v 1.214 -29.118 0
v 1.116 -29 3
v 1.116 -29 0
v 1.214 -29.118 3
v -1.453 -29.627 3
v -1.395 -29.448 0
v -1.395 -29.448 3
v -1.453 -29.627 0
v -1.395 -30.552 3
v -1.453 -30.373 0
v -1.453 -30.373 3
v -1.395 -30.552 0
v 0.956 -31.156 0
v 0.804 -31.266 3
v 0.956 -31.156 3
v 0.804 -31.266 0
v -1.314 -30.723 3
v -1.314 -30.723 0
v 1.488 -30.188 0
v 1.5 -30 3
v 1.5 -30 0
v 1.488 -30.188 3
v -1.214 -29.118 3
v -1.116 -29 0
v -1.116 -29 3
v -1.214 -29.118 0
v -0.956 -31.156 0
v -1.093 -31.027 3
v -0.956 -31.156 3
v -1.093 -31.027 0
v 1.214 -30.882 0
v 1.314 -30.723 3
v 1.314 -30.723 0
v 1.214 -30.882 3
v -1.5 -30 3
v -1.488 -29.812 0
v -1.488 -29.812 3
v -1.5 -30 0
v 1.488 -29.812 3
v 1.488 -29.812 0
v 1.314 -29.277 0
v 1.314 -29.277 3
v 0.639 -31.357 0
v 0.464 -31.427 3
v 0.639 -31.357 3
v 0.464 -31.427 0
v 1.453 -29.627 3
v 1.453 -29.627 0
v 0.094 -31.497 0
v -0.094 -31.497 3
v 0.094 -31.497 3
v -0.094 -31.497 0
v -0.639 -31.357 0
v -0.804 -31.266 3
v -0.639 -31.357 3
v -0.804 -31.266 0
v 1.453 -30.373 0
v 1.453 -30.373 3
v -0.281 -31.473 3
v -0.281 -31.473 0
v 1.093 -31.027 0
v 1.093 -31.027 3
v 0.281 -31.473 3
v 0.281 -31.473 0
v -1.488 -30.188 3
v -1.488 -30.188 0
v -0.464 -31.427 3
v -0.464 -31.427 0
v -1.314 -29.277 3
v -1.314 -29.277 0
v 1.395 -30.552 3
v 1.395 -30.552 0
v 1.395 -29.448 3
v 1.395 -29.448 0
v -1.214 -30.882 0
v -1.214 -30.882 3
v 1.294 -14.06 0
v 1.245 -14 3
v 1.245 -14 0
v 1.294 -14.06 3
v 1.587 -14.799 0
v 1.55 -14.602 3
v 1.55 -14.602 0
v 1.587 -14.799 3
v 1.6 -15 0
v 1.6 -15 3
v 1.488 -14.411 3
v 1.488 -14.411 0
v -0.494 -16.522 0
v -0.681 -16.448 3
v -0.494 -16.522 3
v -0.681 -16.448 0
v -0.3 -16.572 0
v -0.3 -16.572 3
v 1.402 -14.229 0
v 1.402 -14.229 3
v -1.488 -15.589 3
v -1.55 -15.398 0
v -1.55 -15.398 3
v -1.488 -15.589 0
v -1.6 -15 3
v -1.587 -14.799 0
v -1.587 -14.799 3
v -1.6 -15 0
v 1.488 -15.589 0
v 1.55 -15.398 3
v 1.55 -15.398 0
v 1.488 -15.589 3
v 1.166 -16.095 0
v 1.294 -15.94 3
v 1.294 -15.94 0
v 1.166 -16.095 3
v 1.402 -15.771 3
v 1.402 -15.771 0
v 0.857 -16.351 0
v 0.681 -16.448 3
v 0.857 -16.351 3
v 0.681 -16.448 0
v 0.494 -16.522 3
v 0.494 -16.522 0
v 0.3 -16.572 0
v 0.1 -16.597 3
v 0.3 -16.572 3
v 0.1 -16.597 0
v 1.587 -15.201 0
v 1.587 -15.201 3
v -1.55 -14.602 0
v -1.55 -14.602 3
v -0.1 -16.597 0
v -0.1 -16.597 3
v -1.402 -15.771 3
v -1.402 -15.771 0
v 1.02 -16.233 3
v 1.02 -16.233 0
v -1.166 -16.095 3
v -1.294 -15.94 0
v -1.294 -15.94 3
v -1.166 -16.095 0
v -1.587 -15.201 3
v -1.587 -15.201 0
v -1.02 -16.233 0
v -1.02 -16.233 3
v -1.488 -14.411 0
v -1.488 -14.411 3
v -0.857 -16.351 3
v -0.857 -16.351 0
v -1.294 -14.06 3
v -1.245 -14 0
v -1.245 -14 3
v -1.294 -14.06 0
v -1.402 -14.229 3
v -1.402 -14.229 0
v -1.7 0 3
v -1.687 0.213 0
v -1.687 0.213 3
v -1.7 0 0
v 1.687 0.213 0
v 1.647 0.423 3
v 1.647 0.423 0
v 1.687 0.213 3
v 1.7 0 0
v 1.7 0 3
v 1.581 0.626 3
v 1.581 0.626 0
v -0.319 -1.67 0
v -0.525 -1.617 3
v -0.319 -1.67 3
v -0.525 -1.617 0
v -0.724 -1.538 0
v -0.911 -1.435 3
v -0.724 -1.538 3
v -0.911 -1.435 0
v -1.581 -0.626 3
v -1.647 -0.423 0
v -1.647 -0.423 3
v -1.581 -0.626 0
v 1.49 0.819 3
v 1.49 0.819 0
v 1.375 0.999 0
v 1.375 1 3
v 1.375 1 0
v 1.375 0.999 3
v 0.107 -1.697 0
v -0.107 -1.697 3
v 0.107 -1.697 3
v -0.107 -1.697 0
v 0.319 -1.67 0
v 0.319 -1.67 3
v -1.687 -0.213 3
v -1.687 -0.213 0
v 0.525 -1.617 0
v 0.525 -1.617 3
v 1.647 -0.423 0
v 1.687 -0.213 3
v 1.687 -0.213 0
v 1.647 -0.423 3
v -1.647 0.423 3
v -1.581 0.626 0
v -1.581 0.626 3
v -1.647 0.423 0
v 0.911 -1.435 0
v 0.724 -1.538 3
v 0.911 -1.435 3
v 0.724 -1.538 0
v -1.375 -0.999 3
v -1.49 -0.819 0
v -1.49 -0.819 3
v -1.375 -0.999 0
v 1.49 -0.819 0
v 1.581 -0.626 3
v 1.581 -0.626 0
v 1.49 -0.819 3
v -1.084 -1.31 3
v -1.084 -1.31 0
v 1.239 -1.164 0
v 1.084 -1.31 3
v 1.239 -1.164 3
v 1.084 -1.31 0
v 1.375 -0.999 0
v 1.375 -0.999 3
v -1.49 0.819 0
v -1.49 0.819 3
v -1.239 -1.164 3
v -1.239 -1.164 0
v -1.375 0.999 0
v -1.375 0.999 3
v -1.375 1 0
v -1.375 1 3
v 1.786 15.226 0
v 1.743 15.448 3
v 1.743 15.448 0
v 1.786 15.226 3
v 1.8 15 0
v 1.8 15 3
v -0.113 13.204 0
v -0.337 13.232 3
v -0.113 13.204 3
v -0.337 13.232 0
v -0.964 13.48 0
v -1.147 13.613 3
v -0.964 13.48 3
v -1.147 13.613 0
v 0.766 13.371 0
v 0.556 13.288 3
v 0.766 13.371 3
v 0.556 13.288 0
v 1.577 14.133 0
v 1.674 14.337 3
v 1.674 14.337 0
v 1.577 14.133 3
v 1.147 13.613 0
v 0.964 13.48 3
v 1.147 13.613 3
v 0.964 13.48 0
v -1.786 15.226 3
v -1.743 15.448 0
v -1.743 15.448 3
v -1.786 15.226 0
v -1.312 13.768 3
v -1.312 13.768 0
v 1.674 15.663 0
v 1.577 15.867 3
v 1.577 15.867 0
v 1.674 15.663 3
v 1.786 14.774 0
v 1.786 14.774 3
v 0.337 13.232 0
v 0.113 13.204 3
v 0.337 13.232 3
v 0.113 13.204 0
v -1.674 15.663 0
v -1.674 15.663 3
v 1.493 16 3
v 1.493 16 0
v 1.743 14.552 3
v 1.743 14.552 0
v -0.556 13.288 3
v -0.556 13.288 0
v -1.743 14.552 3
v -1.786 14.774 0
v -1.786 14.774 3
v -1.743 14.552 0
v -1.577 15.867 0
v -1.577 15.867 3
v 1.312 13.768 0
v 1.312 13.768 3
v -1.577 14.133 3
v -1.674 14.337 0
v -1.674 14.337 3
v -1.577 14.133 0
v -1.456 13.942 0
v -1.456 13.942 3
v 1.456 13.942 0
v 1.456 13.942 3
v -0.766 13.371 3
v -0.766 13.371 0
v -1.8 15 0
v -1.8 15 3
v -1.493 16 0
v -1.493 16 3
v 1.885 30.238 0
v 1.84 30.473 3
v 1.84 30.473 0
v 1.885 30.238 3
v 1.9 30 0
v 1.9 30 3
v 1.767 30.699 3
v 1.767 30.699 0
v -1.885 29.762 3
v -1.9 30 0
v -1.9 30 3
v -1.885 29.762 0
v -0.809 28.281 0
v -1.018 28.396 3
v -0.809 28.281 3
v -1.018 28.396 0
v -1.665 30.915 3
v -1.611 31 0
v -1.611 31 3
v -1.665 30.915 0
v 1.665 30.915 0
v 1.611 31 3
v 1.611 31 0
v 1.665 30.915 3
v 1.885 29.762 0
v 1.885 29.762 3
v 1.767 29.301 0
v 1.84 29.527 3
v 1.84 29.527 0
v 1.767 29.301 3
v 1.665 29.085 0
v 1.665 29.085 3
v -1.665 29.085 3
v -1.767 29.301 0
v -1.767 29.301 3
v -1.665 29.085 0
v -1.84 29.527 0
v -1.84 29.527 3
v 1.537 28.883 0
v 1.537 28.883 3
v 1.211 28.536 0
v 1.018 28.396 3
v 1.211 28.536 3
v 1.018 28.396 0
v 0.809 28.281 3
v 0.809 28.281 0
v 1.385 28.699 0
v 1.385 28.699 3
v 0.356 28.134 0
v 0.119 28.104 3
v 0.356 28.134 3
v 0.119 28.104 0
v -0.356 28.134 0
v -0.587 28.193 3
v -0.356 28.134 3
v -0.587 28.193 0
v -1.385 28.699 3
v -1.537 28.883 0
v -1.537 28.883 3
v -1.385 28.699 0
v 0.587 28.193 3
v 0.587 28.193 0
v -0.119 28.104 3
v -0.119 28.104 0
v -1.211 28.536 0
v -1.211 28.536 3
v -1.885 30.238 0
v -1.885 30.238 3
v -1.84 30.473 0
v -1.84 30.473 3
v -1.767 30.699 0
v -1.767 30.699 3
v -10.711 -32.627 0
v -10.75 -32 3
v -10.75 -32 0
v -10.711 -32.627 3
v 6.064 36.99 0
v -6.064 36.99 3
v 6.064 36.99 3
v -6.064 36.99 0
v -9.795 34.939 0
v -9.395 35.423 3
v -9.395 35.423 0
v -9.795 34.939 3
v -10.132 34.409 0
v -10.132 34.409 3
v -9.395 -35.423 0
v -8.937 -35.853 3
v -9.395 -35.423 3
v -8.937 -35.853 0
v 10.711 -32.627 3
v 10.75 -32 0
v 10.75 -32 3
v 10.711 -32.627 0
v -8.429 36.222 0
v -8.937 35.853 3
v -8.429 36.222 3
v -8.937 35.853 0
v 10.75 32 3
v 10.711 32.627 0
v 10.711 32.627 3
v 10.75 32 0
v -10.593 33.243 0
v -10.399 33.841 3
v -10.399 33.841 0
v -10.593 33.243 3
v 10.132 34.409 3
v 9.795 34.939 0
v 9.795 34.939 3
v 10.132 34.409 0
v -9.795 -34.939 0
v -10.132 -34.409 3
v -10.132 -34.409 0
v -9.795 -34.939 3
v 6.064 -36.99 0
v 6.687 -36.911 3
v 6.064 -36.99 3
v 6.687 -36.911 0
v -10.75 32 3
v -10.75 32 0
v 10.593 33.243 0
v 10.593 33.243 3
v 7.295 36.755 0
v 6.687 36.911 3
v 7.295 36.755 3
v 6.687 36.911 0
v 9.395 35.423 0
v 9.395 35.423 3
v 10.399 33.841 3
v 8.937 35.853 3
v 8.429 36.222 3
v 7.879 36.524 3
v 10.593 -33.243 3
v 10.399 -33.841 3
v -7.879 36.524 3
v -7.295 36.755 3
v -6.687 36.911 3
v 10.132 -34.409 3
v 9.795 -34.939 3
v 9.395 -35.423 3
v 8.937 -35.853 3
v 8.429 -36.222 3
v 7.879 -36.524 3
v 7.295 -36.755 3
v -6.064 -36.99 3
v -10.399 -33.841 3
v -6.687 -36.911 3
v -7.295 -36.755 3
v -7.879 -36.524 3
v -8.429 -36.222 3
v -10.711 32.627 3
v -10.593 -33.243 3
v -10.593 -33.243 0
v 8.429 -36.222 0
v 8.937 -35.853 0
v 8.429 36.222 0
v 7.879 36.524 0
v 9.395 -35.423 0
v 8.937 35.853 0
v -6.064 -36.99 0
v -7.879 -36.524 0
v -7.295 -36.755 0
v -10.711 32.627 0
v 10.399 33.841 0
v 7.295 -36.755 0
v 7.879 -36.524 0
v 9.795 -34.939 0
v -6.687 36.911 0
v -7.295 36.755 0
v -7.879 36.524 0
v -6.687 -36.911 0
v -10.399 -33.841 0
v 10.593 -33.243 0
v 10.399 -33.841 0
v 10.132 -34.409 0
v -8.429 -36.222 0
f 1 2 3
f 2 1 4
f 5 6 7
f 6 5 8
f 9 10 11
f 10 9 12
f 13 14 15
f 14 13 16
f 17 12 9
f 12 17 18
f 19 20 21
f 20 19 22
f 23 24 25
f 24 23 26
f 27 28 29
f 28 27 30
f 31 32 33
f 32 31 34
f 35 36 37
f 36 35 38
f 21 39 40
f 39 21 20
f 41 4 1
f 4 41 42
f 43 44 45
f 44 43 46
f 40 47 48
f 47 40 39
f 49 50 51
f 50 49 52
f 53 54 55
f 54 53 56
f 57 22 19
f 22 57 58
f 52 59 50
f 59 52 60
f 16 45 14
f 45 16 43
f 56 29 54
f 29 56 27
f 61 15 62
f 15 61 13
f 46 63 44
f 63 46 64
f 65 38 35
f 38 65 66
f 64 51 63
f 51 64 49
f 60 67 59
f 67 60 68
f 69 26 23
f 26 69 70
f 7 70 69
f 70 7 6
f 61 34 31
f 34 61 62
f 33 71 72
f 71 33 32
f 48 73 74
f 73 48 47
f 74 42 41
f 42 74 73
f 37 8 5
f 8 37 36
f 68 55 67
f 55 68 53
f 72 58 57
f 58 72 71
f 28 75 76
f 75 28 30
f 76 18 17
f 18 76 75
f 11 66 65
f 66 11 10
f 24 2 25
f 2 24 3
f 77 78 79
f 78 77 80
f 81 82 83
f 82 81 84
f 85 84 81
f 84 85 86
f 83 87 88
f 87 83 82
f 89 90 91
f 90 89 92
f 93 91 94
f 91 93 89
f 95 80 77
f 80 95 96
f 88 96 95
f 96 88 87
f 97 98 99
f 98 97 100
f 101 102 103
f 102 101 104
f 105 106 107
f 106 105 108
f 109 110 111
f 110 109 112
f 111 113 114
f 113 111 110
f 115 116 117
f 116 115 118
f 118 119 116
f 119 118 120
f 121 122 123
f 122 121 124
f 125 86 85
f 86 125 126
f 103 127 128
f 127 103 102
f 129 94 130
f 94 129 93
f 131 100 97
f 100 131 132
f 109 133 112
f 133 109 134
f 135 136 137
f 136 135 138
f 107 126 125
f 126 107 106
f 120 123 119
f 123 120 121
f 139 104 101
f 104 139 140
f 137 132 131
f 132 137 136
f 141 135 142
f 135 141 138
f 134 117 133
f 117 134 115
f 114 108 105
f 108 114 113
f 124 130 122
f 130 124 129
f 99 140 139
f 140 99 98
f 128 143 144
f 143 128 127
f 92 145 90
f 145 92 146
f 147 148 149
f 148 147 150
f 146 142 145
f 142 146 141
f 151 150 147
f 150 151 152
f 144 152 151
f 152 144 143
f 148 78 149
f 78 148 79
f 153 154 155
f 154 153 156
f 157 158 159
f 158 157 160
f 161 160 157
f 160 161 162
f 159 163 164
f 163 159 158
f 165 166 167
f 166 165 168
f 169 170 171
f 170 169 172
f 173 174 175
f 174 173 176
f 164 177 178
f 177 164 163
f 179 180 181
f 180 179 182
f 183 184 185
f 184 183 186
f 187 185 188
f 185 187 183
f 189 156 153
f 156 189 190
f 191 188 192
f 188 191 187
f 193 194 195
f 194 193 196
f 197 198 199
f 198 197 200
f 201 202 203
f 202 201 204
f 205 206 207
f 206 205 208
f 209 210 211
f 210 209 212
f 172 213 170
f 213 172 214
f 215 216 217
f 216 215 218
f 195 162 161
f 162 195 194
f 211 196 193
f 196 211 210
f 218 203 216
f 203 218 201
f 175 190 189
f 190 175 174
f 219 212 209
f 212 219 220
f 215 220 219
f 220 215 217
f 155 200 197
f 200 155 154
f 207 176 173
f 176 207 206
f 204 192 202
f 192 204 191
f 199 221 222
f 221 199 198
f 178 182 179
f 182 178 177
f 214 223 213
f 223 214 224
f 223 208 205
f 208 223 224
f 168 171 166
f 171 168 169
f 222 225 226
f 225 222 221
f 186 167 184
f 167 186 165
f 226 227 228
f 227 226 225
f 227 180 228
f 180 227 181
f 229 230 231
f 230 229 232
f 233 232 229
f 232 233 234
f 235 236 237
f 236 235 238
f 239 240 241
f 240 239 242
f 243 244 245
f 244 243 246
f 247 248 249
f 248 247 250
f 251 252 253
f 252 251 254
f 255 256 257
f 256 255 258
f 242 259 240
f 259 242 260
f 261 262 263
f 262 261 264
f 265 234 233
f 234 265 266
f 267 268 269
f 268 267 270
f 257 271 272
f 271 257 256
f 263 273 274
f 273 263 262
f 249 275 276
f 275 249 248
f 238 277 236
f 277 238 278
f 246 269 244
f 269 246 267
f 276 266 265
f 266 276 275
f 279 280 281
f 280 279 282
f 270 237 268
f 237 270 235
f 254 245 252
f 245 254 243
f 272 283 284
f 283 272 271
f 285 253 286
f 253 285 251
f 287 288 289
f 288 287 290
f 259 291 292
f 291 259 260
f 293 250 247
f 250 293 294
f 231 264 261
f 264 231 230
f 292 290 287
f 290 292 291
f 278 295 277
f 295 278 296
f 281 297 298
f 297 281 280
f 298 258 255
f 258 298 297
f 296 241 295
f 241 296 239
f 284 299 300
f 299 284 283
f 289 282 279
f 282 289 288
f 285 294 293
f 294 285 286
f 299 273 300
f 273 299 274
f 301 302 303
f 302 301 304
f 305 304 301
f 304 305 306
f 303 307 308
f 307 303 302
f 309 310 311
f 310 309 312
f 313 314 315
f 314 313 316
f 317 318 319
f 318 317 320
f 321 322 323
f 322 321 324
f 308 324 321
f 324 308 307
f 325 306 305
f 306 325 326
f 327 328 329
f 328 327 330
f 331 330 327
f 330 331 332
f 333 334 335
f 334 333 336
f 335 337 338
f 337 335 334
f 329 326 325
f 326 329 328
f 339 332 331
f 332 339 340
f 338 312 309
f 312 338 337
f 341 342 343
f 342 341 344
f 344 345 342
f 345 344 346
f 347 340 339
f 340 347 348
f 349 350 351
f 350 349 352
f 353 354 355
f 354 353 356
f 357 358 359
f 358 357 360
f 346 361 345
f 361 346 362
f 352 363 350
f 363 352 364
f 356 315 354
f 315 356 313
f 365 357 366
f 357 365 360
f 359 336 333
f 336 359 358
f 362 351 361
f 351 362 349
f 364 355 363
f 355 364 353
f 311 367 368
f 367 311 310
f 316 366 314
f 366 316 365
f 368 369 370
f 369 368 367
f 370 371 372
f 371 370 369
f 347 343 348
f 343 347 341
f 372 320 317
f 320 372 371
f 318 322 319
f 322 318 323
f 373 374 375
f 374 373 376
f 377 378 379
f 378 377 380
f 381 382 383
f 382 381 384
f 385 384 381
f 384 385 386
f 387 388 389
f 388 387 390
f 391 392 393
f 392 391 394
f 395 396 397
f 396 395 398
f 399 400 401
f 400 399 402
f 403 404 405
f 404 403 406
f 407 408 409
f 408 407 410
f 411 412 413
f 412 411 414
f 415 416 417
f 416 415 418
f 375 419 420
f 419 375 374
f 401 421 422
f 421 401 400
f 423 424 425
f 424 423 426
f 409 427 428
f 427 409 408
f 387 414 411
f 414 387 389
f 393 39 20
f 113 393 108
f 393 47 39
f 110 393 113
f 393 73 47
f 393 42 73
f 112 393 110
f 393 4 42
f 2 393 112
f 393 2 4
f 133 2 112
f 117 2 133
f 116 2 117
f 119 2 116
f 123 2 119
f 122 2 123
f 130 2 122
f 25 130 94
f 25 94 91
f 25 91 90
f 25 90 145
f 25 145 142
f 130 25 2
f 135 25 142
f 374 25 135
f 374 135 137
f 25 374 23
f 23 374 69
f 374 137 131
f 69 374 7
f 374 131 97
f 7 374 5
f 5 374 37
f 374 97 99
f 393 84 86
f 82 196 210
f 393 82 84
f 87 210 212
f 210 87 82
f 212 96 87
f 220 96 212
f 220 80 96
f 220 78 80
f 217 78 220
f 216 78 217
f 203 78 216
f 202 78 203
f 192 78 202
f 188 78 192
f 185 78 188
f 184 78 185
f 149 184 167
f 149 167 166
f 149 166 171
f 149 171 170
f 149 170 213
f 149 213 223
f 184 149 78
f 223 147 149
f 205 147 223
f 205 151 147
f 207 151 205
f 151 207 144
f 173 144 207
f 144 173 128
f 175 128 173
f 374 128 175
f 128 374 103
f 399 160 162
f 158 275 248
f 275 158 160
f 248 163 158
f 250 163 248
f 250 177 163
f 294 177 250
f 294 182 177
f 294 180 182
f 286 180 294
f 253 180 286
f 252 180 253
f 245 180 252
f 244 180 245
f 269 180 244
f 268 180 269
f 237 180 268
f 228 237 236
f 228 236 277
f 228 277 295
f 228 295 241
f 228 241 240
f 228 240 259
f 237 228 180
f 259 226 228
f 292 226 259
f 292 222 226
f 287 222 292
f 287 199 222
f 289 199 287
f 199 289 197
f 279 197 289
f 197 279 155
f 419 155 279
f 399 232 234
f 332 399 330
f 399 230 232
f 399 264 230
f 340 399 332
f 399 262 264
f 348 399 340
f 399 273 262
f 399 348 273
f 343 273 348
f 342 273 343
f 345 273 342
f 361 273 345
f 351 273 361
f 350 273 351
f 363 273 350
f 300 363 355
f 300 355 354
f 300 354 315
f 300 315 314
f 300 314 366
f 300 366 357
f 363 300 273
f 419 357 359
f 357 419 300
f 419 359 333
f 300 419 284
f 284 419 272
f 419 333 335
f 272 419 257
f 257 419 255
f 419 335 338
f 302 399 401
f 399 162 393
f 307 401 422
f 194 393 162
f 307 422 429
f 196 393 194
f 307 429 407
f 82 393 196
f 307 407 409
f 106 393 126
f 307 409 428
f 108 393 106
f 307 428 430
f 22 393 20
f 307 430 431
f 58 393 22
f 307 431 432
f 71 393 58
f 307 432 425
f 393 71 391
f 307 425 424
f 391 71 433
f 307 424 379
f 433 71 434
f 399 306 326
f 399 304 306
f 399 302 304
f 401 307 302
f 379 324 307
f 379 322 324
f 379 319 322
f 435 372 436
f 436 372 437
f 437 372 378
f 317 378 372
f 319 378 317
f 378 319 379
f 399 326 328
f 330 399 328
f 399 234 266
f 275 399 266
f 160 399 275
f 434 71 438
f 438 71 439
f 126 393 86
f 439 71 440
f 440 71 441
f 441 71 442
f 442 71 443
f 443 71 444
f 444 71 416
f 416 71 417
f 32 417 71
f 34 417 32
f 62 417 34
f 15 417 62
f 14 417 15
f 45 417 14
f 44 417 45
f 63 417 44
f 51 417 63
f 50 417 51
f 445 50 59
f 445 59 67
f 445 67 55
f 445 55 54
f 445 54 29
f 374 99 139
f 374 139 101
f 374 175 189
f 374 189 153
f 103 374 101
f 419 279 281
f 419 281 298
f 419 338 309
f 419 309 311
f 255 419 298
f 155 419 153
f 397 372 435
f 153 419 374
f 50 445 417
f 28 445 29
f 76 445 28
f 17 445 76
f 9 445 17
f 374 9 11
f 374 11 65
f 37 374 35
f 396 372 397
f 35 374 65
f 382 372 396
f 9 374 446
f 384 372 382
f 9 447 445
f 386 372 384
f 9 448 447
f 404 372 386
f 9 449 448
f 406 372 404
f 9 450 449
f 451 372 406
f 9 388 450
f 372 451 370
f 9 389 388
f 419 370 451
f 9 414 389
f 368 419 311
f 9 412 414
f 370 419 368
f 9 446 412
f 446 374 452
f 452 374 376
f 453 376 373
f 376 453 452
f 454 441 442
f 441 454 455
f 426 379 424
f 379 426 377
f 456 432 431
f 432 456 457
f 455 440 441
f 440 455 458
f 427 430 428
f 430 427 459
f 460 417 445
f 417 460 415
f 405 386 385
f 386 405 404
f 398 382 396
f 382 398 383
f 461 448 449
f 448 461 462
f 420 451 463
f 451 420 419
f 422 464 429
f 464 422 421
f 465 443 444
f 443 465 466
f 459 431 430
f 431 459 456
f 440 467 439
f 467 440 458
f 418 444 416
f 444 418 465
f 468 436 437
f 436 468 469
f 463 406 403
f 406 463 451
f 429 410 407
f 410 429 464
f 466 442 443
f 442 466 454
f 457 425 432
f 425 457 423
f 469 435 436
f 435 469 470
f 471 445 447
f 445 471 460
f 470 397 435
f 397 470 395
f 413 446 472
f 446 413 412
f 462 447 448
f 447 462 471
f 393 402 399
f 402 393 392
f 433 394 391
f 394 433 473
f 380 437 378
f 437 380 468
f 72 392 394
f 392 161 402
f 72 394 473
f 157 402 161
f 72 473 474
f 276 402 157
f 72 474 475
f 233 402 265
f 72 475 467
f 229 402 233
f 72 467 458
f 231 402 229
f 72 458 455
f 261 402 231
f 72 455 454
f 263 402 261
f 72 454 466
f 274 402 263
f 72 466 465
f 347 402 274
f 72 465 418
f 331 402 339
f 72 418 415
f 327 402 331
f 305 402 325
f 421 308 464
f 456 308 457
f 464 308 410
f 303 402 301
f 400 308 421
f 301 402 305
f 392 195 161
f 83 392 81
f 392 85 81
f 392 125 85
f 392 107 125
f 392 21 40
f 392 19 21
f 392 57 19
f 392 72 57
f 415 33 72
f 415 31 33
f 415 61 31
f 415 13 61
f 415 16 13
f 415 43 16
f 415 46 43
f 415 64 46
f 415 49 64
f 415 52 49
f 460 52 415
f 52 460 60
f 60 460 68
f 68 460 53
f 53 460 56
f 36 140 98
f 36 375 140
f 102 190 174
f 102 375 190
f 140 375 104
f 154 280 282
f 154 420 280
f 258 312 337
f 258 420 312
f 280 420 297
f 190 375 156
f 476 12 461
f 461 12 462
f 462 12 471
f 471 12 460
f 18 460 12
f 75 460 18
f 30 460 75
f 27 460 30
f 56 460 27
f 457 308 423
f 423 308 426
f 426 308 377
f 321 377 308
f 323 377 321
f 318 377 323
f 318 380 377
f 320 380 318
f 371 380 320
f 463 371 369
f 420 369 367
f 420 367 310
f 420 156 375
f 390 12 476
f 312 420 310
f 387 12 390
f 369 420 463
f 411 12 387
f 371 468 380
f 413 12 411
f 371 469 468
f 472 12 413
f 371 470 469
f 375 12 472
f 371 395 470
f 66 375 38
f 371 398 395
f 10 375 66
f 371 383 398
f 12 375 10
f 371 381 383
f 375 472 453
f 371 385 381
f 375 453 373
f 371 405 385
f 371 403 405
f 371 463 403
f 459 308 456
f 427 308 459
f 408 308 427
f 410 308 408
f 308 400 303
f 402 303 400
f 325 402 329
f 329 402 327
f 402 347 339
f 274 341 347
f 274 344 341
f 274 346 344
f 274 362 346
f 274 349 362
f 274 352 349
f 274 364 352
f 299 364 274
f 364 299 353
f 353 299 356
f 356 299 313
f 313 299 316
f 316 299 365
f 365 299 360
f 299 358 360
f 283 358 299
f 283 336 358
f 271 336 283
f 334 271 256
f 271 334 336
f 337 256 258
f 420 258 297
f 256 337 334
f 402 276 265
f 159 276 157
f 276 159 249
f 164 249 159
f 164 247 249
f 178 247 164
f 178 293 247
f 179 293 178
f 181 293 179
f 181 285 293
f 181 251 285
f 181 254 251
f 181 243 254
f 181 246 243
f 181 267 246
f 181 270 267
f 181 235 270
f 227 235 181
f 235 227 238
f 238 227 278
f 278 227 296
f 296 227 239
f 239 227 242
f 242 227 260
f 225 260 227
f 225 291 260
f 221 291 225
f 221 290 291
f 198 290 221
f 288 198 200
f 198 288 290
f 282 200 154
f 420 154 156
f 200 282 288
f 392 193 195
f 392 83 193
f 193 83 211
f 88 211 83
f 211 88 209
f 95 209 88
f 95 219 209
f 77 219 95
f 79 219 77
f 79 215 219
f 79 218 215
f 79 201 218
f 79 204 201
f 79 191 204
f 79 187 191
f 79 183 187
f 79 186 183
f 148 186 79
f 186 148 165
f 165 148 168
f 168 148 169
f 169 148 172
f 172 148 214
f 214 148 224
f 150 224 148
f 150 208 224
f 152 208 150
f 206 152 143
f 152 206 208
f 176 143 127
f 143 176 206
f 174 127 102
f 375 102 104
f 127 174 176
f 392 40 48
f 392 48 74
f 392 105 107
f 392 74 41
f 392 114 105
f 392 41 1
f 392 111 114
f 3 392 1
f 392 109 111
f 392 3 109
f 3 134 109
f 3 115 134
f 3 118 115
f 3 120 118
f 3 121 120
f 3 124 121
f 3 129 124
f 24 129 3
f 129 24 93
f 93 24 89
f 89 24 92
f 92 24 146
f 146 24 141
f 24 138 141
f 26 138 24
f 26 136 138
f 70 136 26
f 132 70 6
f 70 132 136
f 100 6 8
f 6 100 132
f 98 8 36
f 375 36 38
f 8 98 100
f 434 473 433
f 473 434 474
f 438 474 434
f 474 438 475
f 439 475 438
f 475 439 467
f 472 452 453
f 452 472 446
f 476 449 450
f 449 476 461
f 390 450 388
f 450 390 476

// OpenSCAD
$fn = 50;


difference() {
	union() {
		*color(alpha = 1.0000000000, c = "gray") {
			translate(v = [0, 14, 0]) {
				linear_extrude(height = 5) {
					text(font = "Arial:style=Bold", halign = "center", size = 4.5000000000, text = "COMMENT description oobb_plate_shape_p_type_3_depth_1.5_width_5_height", valign = "center");
				}
			}
		}
		hull() {
			translate(v = [-5.7500000000, 32.0000000000, 0]) {
				cylinder(h = 3, r = 5);
			}
			translate(v = [5.7500000000, 32.0000000000, 0]) {
				cylinder(h = 3, r = 5);
			}
			translate(v = [-5.7500000000, -32.0000000000, 0]) {
				cylinder(h = 3, r = 5);
			}
			translate(v = [5.7500000000, -32.0000000000, 0]) {
				cylinder(h = 3, r = 5);
			}
		}
		*color(alpha = 1.0000000000, c = "gray") {
			translate(v = [0, 21, 0]) {
				linear_extrude(height = 1) {
					text(font = "Arial:style=Bold", halign = "center", size = 4.5000000000, text = "COMMENT oobb_motor_n20_0_0", valign = "center");
				}
			}
		}
		*color(alpha = 1.0000000000, c = "gray") {
			translate(v = [0, 14, 0]) {
				linear_extrude(height = 1) {
					text(font = "Arial:style=Bold", halign = "center", size = 4.5000000000, text = " radius_extra : 0", valign = "center");
				}
			}
		}
		*color(alpha = 1.0000000000, c = "gray") {
			translate(v = [0, 36, 0]) {
				linear_extrude(height = 1) {
					text(font = "Arial:style=Bold", halign = "center", size = 4.5000000000, text = "COMMENT oobb_motor_n20_0.1_0.1", valign = "center");
				}
			}
		}
		*color(alpha = 1.0000000000, c = "gray") {
			translate(v = [0, 29, 0]) {
				linear_extrude(height = 1) {
					text(font = "Arial:style=Bold", halign = "center", size = 4.5000000000, text = " radius_extra : 0.1", valign = "center");
				}
			}
		}
		*color(alpha = 1.0000000000, c = "gray") {
			translate(v = [0, 51, 0]) {
				linear_extrude(height = 1) {
					text(font = "Arial:style=Bold", halign = "center", size = 4.5000000000, text = "COMMENT oobb_motor_n20_0.2_0.2", valign = "center");
				}
			}
		}
		*color(alpha = 1.0000000000, c = "gray") {
			translate(v = [0, 44, 0]) {
				linear_extrude(height = 1) {
					text(font = "Arial:style=Bold", halign = "center", size = 4.5000000000, text = " radius_extra : 0.2", valign = "center");
				}
			}
		}
		*color(alpha = 1.0000000000, c = "gray") {
			translate(v = [0, 66, 0]) {
				linear_extrude(height = 1) {
					text(font = "Arial:style=Bold", halign = "center", size = 4.5000000000, text = "COMMENT oobb_motor_n20_0.3_0.3", valign = "center");
				}
			}
		}
		*color(alpha = 1.0000000000, c = "gray") {
			translate(v = [0, 59, 0]) {
				linear_extrude(height = 1) {
					text(font = "Arial:style=Bold", halign = "center", size = 4.5000000000, text = " radius_extra : 0.3", valign = "center");
				}
			}
		}
		*color(alpha = 1.0000000000, c = "gray") {
			translate(v = [0, 81, 0]) {
				linear_extrude(height = 1) {
					text(font = "Arial:style=Bold", halign = "center", size = 4.5000000000, text = "COMMENT oobb_motor_n20_0.4_0.4", valign = "center");
				}
			}
		}
		*color(alpha = 1.0000000000, c = "gray") {
			translate(v = [0, 74, 0]) {
				linear_extrude(height = 1) {
					text(font = "Arial:style=Bold", halign = "center", size = 4.5000000000, text = " radius_extra : 0.4", valign = "center");
				}
			}
		}
	}
	union() {
		*color(alpha = 1.0000000000, c = "gray") {
			translate(v = [0, 14, 0]) {
				linear_extrude(height = 1) {
					text(font = "Arial:style=Bold", halign = "center", size = 4.5000000000, text = "COMMENT description oobb_motor_n20_shape_n_type_0_-30_0_pos_shaft_part_30_comment_shift_line_{}_extra_0_radius_extra", valign = "center");
				}
			}
		}
		translate(v = [0, -30, 125]) {
			difference() {
				translate(v = [0, 0, -250]) {
					cylinder(h = 250, r = 1.5000000000);
				}
				translate(v = [-1.5000000000, 1.0000000000, -250]) {
					cube(size = [3.0000000000, 0.5000000000, 250]);
				}
			}
		}
		*color(alpha = 1.0000000000, c = "gray") {
			translate(v = [0, 29, 0]) {
				linear_extrude(height = 1) {
					text(font = "Arial:style=Bold", halign = "center", size = 4.5000000000, text = "COMMENT description oobb_motor_n20_shape_n_type_0_-15_0_pos_shaft_part_30_comment_shift_line_{}_extra_0.1_radius_extra", valign = "center");
				}
			}
		}
		translate(v = [0, -15, 125]) {
			difference() {
				translate(v = [0, 0, -250]) {
					cylinder(h = 250, r = 1.6000000000);
				}
				translate(v = [-1.6000000000, 1.0000000000, -250]) {
					cube(size = [3.2000000000, 0.6000000000, 250]);
				}
			}
		}
		*color(alpha = 1.0000000000, c = "gray") {
			translate(v = [0, 44, 0]) {
				linear_extrude(height = 1) {
					text(font = "Arial:style=Bold", halign = "center", size = 4.5000000000, text = "COMMENT description oobb_motor_n20_shape_n_type_shaft_part_30_comment_shift_line_{}_extra_0.2_radius_extra", valign = "center");
				}
			}
		}
		translate(v = [0, 0, 125]) {
			difference() {
				translate(v = [0, 0, -250]) {
					cylinder(h = 250, r = 1.7000000000);
				}
				translate(v = [-1.7000000000, 1.0000000000, -250]) {
					cube(size = [3.4000000000, 0.7000000000, 250]);
				}
			}
		}
		*color(alpha = 1.0000000000, c = "gray") {
			translate(v = [0, 59, 0]) {
				linear_extrude(height = 1) {
					text(font = "Arial:style=Bold", halign = "center", size = 4.5000000000, text = "COMMENT description oobb_motor_n20_shape_n_type_0_15_0_pos_shaft_part_30_comment_shift_line_{}_extra_0.3_radius_extra", valign = "center");
				}
			}
		}
		translate(v = [0, 15, 125]) {
			difference() {
				translate(v = [0, 0, -250]) {
					cylinder(h = 250, r = 1.8000000000);
				}
				translate(v = [-1.8000000000, 1.0000000000, -250]) {
					cube(size = [3.6000000000, 0.8000000000, 250]);
				}
			}
		}
		*color(alpha = 1.0000000000, c = "gray") {
			translate(v = [0, 74, 0]) {
				linear_extrude(height = 1) {
					text(font = "Arial:style=Bold", halign = "center", size = 4.5000000000, text = "COMMENT description oobb_motor_n20_shape_n_type_0_30_0_pos_shaft_part_30_comment_shift_line_{}_extra_0.4_radius_extra", valign = "center");
				}
			}
		}
		translate(v = [0, 30, 125]) {
			difference() {
				translate(v = [0, 0, -250]) {
					cylinder(h = 250, r = 1.9000000000);
				}
				translate(v = [-1.9000000000, 1.0000000000, -250]) {
					cube(size = [3.8000000000, 0.9000000000, 250]);
				}
			}
		}
	}
}
